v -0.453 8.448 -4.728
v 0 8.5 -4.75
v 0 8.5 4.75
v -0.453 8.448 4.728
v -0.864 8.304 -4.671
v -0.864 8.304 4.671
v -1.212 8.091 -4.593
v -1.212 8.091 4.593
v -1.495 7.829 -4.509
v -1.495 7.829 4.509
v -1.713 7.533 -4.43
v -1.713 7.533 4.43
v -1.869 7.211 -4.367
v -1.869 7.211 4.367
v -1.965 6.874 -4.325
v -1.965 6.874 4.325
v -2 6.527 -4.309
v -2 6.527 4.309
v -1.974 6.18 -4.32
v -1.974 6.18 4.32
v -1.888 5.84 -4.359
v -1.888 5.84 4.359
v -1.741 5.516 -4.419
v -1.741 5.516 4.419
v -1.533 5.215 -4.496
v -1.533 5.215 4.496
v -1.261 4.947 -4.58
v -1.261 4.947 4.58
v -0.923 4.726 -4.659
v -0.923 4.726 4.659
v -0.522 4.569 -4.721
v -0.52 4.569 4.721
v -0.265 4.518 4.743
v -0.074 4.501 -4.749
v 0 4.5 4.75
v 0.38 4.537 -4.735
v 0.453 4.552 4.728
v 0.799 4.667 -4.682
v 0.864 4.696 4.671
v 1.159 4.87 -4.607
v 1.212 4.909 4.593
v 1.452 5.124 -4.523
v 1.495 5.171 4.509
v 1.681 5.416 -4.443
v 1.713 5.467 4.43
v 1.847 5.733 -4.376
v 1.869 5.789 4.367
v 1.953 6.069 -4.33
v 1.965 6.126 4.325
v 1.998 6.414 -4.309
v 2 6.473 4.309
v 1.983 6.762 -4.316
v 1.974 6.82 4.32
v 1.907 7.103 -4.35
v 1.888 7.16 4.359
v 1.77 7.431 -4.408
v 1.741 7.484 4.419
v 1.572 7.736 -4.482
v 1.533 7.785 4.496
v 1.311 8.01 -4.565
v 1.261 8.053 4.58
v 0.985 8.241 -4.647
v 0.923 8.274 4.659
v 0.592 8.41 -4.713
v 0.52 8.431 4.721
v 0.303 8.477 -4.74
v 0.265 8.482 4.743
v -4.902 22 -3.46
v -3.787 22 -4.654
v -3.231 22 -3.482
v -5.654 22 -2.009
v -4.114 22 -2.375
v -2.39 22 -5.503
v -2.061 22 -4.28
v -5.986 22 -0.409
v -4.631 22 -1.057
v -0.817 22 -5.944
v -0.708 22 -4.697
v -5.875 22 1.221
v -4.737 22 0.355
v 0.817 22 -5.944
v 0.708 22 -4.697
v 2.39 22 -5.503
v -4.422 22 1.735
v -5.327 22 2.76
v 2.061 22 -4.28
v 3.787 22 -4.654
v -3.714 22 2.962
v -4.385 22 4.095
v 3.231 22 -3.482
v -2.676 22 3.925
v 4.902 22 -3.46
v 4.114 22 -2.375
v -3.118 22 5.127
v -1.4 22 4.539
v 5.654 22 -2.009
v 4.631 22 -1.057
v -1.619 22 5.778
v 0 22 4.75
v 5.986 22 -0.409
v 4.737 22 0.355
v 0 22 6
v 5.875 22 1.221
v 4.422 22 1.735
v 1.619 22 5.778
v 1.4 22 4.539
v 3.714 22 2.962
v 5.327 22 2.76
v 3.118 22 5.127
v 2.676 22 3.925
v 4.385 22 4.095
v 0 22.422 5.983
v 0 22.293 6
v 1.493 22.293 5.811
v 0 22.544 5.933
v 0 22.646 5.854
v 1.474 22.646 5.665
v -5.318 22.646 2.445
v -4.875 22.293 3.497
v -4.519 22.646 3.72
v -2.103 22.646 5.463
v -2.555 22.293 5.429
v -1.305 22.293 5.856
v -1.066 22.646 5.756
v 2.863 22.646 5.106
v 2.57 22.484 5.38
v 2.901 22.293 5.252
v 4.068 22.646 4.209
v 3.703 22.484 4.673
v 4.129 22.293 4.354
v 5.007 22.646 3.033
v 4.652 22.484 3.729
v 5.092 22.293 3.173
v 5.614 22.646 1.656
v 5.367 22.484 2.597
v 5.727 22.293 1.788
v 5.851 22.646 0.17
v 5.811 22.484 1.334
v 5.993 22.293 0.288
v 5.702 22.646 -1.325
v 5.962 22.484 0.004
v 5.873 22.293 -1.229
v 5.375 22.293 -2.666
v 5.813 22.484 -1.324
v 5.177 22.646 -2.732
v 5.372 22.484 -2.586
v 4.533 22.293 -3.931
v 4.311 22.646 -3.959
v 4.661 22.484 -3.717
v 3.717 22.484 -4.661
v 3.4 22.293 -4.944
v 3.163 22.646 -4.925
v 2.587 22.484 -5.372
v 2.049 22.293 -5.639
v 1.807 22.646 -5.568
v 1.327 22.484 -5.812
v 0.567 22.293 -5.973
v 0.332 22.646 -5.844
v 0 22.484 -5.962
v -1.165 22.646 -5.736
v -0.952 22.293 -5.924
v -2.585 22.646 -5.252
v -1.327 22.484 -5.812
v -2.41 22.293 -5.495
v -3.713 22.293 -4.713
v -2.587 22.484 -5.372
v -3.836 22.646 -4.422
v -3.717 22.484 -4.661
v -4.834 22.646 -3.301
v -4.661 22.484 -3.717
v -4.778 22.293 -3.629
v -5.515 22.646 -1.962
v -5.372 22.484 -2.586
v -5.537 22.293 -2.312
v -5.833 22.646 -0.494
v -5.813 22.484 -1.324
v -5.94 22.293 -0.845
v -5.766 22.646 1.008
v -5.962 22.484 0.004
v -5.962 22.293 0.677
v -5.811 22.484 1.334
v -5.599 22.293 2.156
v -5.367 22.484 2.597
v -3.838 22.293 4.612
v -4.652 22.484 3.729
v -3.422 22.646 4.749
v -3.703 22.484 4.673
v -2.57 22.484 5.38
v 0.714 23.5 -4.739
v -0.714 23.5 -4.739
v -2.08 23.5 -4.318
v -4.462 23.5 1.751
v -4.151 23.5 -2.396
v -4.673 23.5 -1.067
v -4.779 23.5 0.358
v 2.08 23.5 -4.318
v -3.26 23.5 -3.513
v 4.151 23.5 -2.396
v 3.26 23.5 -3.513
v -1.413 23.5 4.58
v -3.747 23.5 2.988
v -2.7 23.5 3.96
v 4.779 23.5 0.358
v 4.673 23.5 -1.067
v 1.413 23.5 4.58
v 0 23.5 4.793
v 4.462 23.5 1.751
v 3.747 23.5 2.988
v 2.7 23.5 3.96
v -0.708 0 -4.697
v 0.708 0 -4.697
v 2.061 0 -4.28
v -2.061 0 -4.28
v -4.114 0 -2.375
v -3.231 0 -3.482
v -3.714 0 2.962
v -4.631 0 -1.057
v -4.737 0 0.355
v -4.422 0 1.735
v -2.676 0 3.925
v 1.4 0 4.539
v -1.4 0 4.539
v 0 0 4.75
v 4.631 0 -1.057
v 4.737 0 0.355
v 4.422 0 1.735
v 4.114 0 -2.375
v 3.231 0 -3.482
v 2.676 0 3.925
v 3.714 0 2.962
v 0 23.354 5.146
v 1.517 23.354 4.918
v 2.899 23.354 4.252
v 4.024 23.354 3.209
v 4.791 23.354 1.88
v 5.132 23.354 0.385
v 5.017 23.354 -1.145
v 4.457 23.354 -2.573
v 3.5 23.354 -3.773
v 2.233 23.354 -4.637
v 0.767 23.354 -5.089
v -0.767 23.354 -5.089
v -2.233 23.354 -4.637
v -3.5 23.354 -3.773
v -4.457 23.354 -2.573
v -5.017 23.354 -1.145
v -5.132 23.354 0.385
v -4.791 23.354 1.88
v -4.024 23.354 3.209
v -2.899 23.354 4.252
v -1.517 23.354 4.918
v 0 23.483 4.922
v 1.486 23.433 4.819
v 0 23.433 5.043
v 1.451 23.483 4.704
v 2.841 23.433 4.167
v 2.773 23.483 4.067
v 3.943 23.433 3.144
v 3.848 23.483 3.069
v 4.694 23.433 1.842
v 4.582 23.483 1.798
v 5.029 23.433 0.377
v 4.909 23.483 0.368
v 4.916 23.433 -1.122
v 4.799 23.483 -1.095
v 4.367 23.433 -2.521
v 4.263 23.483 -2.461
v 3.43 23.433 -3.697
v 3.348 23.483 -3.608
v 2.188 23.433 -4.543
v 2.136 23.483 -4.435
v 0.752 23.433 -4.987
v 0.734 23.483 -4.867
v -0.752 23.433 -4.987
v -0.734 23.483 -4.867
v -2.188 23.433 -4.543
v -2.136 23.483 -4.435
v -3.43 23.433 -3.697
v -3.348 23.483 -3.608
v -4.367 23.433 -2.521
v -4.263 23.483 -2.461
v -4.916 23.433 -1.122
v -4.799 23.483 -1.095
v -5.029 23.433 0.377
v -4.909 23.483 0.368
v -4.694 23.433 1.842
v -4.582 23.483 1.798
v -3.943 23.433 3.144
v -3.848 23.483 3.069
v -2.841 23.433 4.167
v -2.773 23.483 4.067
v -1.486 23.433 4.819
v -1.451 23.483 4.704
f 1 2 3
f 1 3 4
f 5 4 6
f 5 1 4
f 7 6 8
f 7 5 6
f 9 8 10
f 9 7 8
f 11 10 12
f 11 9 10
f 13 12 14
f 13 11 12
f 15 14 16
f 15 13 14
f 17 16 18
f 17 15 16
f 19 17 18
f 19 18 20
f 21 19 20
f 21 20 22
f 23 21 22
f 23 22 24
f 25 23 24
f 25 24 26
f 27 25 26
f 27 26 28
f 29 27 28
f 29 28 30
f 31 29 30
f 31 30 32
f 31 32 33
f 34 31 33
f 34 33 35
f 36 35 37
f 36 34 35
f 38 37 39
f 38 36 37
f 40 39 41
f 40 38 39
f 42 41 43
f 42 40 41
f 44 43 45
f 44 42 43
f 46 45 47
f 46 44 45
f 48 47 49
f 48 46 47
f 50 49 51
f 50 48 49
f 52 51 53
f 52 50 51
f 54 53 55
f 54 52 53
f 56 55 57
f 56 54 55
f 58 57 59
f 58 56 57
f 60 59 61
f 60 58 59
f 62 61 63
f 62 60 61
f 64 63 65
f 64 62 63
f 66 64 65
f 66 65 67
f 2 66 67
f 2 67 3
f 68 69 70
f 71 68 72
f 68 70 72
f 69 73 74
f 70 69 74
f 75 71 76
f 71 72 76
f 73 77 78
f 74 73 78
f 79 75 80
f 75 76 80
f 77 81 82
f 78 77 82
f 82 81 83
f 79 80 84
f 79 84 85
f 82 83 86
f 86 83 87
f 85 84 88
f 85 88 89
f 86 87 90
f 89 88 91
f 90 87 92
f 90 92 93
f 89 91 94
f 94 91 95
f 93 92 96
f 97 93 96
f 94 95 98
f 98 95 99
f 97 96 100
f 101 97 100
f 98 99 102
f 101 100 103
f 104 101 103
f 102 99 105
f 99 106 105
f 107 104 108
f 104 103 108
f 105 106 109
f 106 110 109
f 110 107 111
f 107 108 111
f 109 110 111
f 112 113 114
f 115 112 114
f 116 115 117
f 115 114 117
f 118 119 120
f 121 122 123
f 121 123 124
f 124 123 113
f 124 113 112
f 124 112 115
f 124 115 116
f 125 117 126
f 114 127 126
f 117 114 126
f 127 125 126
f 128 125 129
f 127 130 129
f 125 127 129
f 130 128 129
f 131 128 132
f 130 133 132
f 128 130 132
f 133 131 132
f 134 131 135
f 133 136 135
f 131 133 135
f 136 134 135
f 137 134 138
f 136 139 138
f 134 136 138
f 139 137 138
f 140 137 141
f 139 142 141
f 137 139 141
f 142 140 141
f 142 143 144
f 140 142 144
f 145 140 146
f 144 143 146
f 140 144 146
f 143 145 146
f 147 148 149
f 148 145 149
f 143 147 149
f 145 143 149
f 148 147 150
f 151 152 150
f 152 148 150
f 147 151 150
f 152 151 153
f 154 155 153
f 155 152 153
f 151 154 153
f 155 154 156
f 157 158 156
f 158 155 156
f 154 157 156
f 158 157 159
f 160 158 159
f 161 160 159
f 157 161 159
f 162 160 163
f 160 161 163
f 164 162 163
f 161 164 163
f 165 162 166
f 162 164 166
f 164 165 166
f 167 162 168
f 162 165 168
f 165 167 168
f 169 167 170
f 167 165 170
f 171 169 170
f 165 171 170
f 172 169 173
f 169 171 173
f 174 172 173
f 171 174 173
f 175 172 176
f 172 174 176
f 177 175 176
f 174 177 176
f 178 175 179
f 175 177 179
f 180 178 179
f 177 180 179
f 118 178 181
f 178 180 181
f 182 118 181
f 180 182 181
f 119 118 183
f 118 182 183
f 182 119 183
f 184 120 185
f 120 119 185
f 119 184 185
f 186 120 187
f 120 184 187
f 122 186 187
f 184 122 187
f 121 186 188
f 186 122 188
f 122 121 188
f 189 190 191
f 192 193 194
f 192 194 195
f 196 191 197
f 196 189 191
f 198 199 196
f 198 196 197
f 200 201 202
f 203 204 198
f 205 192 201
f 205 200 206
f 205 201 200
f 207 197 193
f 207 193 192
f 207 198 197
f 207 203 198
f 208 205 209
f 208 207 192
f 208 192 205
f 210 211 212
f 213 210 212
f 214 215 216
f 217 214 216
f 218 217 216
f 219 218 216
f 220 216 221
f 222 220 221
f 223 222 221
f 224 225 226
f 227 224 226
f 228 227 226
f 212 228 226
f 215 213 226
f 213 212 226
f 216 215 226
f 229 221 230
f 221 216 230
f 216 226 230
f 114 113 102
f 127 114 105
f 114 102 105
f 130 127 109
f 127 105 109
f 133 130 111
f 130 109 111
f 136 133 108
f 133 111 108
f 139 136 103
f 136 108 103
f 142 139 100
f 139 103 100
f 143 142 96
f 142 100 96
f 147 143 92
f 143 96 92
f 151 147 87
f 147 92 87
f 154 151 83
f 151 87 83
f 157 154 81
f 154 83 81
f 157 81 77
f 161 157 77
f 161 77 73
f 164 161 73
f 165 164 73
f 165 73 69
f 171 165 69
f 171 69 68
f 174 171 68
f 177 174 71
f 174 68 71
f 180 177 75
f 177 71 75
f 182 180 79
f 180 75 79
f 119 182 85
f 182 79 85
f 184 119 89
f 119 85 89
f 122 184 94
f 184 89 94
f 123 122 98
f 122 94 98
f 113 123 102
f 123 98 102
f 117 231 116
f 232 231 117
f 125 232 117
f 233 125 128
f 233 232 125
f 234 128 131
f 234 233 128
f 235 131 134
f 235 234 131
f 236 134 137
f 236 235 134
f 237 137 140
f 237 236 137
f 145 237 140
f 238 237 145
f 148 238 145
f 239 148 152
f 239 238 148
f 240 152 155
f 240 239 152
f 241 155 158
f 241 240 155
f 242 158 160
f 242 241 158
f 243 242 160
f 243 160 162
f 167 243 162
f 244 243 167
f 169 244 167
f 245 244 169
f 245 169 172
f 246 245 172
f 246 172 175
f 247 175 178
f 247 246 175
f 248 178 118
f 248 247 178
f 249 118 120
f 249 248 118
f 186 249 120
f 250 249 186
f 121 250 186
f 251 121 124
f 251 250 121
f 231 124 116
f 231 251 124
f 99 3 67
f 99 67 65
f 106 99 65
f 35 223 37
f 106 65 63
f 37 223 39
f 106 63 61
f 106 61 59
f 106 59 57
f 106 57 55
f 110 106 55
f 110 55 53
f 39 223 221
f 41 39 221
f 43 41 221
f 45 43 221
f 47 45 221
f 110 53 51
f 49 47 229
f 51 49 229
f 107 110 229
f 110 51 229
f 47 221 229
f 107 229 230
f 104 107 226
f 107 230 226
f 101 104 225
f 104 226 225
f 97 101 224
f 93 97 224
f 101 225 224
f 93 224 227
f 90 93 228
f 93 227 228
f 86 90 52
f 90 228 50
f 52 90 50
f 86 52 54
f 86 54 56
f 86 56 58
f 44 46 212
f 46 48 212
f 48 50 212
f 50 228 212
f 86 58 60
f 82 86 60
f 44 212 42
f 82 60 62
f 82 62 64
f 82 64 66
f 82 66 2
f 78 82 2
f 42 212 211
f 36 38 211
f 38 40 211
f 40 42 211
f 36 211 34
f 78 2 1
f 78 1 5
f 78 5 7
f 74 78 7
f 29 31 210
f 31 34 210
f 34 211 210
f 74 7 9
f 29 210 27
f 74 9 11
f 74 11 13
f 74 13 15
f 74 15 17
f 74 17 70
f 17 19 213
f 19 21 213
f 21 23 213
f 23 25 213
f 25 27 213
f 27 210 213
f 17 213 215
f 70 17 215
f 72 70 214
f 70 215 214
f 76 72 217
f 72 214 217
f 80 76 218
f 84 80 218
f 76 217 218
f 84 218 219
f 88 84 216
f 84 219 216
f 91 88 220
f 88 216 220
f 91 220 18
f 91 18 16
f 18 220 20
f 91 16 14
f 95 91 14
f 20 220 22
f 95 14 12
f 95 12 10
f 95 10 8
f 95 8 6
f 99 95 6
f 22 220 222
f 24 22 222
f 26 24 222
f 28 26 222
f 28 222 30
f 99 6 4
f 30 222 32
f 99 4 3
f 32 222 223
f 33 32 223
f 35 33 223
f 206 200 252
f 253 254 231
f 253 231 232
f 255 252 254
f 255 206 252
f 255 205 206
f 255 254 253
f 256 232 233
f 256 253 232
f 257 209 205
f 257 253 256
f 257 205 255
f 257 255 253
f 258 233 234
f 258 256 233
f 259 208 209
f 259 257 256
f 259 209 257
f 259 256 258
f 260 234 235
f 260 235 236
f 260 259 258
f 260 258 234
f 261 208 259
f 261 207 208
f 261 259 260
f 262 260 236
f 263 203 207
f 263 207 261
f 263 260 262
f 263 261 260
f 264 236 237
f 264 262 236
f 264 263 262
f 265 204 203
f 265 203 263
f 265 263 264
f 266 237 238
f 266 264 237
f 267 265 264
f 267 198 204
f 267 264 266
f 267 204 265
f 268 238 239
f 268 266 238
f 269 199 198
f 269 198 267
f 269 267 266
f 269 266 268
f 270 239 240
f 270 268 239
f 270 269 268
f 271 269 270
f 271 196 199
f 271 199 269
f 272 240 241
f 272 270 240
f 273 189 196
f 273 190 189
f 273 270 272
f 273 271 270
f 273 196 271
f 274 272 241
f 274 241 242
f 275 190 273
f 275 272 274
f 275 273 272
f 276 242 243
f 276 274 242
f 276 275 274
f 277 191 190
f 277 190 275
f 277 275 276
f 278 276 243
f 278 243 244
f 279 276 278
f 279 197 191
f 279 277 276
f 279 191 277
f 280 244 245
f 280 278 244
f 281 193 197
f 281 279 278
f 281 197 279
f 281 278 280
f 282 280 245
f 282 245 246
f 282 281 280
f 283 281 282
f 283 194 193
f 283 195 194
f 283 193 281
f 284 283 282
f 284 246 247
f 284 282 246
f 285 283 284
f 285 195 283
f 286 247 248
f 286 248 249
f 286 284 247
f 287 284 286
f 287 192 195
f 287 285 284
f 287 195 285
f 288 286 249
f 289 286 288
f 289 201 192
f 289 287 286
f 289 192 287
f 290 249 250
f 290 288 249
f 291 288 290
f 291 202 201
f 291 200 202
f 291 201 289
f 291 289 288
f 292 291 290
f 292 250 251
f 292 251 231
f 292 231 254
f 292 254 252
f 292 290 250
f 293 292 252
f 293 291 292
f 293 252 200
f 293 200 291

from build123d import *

# Parameters (mm, degrees)
SKETCH1_R               = 4.75
BOSS_EXTRUDE1_DEPTH     = 22
SKETCH2_R               = 6
BOSS_EXTRUDE2_DEPTH     = 1.5
CHAMFER1_SIZE           = 1
FILLET1_R               = 0.5
CUT_EXTRUDE1_DEPTH      = 25.984995545
CUT_EXTRUDE1_DEPTH_BACK = 25.984995545
SKETCH3_R               = 2


with BuildPart() as part:
    # Sketch1 → Boss-Extrude1 (new body)
    with BuildSketch(Plane(origin=(0, 0, 0), x_dir=(1, 0, 0), z_dir=(0, 1, 0))):
        with Locations(Location((0, 0, 0), (0, 0, 270))):
            Circle(SKETCH1_R)
    extrude(amount=BOSS_EXTRUDE1_DEPTH)

    # Sketch2 → Boss-Extrude2 (add)
    with BuildSketch(Plane(origin=(0, 22, 0), x_dir=(1, 0, 0), z_dir=(0, 1, 0))):
        with Locations(Location((0, 0, 0), (0, 0, 270))):
            Circle(SKETCH2_R)
    extrude(amount=BOSS_EXTRUDE2_DEPTH)

    # Chamfer1
    chamfer1_edges = [part.edges().sort_by_distance(p)[0] for p in [
        (0, 23.5, -6),
    ]]
    chamfer(chamfer1_edges, length=CHAMFER1_SIZE)

    # Fillet1
    fillet1_edges = [part.edges().sort_by_distance(p)[0] for p in [
        (0, 23.5, -5),
        (0, 22.5, -6),
    ]]
    fillet(fillet1_edges, radius=FILLET1_R)

    # Sketch3 → Cut-Extrude1 (cut, two sides: drawn at the far end of the back side and taken through both)
    with BuildSketch(Plane.XY.offset(-CUT_EXTRUDE1_DEPTH_BACK)):
        with Locations(Location((0, 6.5, 0), (0, 0, 90))):
            Circle(SKETCH3_R)
    extrude(amount=CUT_EXTRUDE1_DEPTH + CUT_EXTRUDE1_DEPTH_BACK, mode=Mode.SUBTRACT)


solid = part.part
